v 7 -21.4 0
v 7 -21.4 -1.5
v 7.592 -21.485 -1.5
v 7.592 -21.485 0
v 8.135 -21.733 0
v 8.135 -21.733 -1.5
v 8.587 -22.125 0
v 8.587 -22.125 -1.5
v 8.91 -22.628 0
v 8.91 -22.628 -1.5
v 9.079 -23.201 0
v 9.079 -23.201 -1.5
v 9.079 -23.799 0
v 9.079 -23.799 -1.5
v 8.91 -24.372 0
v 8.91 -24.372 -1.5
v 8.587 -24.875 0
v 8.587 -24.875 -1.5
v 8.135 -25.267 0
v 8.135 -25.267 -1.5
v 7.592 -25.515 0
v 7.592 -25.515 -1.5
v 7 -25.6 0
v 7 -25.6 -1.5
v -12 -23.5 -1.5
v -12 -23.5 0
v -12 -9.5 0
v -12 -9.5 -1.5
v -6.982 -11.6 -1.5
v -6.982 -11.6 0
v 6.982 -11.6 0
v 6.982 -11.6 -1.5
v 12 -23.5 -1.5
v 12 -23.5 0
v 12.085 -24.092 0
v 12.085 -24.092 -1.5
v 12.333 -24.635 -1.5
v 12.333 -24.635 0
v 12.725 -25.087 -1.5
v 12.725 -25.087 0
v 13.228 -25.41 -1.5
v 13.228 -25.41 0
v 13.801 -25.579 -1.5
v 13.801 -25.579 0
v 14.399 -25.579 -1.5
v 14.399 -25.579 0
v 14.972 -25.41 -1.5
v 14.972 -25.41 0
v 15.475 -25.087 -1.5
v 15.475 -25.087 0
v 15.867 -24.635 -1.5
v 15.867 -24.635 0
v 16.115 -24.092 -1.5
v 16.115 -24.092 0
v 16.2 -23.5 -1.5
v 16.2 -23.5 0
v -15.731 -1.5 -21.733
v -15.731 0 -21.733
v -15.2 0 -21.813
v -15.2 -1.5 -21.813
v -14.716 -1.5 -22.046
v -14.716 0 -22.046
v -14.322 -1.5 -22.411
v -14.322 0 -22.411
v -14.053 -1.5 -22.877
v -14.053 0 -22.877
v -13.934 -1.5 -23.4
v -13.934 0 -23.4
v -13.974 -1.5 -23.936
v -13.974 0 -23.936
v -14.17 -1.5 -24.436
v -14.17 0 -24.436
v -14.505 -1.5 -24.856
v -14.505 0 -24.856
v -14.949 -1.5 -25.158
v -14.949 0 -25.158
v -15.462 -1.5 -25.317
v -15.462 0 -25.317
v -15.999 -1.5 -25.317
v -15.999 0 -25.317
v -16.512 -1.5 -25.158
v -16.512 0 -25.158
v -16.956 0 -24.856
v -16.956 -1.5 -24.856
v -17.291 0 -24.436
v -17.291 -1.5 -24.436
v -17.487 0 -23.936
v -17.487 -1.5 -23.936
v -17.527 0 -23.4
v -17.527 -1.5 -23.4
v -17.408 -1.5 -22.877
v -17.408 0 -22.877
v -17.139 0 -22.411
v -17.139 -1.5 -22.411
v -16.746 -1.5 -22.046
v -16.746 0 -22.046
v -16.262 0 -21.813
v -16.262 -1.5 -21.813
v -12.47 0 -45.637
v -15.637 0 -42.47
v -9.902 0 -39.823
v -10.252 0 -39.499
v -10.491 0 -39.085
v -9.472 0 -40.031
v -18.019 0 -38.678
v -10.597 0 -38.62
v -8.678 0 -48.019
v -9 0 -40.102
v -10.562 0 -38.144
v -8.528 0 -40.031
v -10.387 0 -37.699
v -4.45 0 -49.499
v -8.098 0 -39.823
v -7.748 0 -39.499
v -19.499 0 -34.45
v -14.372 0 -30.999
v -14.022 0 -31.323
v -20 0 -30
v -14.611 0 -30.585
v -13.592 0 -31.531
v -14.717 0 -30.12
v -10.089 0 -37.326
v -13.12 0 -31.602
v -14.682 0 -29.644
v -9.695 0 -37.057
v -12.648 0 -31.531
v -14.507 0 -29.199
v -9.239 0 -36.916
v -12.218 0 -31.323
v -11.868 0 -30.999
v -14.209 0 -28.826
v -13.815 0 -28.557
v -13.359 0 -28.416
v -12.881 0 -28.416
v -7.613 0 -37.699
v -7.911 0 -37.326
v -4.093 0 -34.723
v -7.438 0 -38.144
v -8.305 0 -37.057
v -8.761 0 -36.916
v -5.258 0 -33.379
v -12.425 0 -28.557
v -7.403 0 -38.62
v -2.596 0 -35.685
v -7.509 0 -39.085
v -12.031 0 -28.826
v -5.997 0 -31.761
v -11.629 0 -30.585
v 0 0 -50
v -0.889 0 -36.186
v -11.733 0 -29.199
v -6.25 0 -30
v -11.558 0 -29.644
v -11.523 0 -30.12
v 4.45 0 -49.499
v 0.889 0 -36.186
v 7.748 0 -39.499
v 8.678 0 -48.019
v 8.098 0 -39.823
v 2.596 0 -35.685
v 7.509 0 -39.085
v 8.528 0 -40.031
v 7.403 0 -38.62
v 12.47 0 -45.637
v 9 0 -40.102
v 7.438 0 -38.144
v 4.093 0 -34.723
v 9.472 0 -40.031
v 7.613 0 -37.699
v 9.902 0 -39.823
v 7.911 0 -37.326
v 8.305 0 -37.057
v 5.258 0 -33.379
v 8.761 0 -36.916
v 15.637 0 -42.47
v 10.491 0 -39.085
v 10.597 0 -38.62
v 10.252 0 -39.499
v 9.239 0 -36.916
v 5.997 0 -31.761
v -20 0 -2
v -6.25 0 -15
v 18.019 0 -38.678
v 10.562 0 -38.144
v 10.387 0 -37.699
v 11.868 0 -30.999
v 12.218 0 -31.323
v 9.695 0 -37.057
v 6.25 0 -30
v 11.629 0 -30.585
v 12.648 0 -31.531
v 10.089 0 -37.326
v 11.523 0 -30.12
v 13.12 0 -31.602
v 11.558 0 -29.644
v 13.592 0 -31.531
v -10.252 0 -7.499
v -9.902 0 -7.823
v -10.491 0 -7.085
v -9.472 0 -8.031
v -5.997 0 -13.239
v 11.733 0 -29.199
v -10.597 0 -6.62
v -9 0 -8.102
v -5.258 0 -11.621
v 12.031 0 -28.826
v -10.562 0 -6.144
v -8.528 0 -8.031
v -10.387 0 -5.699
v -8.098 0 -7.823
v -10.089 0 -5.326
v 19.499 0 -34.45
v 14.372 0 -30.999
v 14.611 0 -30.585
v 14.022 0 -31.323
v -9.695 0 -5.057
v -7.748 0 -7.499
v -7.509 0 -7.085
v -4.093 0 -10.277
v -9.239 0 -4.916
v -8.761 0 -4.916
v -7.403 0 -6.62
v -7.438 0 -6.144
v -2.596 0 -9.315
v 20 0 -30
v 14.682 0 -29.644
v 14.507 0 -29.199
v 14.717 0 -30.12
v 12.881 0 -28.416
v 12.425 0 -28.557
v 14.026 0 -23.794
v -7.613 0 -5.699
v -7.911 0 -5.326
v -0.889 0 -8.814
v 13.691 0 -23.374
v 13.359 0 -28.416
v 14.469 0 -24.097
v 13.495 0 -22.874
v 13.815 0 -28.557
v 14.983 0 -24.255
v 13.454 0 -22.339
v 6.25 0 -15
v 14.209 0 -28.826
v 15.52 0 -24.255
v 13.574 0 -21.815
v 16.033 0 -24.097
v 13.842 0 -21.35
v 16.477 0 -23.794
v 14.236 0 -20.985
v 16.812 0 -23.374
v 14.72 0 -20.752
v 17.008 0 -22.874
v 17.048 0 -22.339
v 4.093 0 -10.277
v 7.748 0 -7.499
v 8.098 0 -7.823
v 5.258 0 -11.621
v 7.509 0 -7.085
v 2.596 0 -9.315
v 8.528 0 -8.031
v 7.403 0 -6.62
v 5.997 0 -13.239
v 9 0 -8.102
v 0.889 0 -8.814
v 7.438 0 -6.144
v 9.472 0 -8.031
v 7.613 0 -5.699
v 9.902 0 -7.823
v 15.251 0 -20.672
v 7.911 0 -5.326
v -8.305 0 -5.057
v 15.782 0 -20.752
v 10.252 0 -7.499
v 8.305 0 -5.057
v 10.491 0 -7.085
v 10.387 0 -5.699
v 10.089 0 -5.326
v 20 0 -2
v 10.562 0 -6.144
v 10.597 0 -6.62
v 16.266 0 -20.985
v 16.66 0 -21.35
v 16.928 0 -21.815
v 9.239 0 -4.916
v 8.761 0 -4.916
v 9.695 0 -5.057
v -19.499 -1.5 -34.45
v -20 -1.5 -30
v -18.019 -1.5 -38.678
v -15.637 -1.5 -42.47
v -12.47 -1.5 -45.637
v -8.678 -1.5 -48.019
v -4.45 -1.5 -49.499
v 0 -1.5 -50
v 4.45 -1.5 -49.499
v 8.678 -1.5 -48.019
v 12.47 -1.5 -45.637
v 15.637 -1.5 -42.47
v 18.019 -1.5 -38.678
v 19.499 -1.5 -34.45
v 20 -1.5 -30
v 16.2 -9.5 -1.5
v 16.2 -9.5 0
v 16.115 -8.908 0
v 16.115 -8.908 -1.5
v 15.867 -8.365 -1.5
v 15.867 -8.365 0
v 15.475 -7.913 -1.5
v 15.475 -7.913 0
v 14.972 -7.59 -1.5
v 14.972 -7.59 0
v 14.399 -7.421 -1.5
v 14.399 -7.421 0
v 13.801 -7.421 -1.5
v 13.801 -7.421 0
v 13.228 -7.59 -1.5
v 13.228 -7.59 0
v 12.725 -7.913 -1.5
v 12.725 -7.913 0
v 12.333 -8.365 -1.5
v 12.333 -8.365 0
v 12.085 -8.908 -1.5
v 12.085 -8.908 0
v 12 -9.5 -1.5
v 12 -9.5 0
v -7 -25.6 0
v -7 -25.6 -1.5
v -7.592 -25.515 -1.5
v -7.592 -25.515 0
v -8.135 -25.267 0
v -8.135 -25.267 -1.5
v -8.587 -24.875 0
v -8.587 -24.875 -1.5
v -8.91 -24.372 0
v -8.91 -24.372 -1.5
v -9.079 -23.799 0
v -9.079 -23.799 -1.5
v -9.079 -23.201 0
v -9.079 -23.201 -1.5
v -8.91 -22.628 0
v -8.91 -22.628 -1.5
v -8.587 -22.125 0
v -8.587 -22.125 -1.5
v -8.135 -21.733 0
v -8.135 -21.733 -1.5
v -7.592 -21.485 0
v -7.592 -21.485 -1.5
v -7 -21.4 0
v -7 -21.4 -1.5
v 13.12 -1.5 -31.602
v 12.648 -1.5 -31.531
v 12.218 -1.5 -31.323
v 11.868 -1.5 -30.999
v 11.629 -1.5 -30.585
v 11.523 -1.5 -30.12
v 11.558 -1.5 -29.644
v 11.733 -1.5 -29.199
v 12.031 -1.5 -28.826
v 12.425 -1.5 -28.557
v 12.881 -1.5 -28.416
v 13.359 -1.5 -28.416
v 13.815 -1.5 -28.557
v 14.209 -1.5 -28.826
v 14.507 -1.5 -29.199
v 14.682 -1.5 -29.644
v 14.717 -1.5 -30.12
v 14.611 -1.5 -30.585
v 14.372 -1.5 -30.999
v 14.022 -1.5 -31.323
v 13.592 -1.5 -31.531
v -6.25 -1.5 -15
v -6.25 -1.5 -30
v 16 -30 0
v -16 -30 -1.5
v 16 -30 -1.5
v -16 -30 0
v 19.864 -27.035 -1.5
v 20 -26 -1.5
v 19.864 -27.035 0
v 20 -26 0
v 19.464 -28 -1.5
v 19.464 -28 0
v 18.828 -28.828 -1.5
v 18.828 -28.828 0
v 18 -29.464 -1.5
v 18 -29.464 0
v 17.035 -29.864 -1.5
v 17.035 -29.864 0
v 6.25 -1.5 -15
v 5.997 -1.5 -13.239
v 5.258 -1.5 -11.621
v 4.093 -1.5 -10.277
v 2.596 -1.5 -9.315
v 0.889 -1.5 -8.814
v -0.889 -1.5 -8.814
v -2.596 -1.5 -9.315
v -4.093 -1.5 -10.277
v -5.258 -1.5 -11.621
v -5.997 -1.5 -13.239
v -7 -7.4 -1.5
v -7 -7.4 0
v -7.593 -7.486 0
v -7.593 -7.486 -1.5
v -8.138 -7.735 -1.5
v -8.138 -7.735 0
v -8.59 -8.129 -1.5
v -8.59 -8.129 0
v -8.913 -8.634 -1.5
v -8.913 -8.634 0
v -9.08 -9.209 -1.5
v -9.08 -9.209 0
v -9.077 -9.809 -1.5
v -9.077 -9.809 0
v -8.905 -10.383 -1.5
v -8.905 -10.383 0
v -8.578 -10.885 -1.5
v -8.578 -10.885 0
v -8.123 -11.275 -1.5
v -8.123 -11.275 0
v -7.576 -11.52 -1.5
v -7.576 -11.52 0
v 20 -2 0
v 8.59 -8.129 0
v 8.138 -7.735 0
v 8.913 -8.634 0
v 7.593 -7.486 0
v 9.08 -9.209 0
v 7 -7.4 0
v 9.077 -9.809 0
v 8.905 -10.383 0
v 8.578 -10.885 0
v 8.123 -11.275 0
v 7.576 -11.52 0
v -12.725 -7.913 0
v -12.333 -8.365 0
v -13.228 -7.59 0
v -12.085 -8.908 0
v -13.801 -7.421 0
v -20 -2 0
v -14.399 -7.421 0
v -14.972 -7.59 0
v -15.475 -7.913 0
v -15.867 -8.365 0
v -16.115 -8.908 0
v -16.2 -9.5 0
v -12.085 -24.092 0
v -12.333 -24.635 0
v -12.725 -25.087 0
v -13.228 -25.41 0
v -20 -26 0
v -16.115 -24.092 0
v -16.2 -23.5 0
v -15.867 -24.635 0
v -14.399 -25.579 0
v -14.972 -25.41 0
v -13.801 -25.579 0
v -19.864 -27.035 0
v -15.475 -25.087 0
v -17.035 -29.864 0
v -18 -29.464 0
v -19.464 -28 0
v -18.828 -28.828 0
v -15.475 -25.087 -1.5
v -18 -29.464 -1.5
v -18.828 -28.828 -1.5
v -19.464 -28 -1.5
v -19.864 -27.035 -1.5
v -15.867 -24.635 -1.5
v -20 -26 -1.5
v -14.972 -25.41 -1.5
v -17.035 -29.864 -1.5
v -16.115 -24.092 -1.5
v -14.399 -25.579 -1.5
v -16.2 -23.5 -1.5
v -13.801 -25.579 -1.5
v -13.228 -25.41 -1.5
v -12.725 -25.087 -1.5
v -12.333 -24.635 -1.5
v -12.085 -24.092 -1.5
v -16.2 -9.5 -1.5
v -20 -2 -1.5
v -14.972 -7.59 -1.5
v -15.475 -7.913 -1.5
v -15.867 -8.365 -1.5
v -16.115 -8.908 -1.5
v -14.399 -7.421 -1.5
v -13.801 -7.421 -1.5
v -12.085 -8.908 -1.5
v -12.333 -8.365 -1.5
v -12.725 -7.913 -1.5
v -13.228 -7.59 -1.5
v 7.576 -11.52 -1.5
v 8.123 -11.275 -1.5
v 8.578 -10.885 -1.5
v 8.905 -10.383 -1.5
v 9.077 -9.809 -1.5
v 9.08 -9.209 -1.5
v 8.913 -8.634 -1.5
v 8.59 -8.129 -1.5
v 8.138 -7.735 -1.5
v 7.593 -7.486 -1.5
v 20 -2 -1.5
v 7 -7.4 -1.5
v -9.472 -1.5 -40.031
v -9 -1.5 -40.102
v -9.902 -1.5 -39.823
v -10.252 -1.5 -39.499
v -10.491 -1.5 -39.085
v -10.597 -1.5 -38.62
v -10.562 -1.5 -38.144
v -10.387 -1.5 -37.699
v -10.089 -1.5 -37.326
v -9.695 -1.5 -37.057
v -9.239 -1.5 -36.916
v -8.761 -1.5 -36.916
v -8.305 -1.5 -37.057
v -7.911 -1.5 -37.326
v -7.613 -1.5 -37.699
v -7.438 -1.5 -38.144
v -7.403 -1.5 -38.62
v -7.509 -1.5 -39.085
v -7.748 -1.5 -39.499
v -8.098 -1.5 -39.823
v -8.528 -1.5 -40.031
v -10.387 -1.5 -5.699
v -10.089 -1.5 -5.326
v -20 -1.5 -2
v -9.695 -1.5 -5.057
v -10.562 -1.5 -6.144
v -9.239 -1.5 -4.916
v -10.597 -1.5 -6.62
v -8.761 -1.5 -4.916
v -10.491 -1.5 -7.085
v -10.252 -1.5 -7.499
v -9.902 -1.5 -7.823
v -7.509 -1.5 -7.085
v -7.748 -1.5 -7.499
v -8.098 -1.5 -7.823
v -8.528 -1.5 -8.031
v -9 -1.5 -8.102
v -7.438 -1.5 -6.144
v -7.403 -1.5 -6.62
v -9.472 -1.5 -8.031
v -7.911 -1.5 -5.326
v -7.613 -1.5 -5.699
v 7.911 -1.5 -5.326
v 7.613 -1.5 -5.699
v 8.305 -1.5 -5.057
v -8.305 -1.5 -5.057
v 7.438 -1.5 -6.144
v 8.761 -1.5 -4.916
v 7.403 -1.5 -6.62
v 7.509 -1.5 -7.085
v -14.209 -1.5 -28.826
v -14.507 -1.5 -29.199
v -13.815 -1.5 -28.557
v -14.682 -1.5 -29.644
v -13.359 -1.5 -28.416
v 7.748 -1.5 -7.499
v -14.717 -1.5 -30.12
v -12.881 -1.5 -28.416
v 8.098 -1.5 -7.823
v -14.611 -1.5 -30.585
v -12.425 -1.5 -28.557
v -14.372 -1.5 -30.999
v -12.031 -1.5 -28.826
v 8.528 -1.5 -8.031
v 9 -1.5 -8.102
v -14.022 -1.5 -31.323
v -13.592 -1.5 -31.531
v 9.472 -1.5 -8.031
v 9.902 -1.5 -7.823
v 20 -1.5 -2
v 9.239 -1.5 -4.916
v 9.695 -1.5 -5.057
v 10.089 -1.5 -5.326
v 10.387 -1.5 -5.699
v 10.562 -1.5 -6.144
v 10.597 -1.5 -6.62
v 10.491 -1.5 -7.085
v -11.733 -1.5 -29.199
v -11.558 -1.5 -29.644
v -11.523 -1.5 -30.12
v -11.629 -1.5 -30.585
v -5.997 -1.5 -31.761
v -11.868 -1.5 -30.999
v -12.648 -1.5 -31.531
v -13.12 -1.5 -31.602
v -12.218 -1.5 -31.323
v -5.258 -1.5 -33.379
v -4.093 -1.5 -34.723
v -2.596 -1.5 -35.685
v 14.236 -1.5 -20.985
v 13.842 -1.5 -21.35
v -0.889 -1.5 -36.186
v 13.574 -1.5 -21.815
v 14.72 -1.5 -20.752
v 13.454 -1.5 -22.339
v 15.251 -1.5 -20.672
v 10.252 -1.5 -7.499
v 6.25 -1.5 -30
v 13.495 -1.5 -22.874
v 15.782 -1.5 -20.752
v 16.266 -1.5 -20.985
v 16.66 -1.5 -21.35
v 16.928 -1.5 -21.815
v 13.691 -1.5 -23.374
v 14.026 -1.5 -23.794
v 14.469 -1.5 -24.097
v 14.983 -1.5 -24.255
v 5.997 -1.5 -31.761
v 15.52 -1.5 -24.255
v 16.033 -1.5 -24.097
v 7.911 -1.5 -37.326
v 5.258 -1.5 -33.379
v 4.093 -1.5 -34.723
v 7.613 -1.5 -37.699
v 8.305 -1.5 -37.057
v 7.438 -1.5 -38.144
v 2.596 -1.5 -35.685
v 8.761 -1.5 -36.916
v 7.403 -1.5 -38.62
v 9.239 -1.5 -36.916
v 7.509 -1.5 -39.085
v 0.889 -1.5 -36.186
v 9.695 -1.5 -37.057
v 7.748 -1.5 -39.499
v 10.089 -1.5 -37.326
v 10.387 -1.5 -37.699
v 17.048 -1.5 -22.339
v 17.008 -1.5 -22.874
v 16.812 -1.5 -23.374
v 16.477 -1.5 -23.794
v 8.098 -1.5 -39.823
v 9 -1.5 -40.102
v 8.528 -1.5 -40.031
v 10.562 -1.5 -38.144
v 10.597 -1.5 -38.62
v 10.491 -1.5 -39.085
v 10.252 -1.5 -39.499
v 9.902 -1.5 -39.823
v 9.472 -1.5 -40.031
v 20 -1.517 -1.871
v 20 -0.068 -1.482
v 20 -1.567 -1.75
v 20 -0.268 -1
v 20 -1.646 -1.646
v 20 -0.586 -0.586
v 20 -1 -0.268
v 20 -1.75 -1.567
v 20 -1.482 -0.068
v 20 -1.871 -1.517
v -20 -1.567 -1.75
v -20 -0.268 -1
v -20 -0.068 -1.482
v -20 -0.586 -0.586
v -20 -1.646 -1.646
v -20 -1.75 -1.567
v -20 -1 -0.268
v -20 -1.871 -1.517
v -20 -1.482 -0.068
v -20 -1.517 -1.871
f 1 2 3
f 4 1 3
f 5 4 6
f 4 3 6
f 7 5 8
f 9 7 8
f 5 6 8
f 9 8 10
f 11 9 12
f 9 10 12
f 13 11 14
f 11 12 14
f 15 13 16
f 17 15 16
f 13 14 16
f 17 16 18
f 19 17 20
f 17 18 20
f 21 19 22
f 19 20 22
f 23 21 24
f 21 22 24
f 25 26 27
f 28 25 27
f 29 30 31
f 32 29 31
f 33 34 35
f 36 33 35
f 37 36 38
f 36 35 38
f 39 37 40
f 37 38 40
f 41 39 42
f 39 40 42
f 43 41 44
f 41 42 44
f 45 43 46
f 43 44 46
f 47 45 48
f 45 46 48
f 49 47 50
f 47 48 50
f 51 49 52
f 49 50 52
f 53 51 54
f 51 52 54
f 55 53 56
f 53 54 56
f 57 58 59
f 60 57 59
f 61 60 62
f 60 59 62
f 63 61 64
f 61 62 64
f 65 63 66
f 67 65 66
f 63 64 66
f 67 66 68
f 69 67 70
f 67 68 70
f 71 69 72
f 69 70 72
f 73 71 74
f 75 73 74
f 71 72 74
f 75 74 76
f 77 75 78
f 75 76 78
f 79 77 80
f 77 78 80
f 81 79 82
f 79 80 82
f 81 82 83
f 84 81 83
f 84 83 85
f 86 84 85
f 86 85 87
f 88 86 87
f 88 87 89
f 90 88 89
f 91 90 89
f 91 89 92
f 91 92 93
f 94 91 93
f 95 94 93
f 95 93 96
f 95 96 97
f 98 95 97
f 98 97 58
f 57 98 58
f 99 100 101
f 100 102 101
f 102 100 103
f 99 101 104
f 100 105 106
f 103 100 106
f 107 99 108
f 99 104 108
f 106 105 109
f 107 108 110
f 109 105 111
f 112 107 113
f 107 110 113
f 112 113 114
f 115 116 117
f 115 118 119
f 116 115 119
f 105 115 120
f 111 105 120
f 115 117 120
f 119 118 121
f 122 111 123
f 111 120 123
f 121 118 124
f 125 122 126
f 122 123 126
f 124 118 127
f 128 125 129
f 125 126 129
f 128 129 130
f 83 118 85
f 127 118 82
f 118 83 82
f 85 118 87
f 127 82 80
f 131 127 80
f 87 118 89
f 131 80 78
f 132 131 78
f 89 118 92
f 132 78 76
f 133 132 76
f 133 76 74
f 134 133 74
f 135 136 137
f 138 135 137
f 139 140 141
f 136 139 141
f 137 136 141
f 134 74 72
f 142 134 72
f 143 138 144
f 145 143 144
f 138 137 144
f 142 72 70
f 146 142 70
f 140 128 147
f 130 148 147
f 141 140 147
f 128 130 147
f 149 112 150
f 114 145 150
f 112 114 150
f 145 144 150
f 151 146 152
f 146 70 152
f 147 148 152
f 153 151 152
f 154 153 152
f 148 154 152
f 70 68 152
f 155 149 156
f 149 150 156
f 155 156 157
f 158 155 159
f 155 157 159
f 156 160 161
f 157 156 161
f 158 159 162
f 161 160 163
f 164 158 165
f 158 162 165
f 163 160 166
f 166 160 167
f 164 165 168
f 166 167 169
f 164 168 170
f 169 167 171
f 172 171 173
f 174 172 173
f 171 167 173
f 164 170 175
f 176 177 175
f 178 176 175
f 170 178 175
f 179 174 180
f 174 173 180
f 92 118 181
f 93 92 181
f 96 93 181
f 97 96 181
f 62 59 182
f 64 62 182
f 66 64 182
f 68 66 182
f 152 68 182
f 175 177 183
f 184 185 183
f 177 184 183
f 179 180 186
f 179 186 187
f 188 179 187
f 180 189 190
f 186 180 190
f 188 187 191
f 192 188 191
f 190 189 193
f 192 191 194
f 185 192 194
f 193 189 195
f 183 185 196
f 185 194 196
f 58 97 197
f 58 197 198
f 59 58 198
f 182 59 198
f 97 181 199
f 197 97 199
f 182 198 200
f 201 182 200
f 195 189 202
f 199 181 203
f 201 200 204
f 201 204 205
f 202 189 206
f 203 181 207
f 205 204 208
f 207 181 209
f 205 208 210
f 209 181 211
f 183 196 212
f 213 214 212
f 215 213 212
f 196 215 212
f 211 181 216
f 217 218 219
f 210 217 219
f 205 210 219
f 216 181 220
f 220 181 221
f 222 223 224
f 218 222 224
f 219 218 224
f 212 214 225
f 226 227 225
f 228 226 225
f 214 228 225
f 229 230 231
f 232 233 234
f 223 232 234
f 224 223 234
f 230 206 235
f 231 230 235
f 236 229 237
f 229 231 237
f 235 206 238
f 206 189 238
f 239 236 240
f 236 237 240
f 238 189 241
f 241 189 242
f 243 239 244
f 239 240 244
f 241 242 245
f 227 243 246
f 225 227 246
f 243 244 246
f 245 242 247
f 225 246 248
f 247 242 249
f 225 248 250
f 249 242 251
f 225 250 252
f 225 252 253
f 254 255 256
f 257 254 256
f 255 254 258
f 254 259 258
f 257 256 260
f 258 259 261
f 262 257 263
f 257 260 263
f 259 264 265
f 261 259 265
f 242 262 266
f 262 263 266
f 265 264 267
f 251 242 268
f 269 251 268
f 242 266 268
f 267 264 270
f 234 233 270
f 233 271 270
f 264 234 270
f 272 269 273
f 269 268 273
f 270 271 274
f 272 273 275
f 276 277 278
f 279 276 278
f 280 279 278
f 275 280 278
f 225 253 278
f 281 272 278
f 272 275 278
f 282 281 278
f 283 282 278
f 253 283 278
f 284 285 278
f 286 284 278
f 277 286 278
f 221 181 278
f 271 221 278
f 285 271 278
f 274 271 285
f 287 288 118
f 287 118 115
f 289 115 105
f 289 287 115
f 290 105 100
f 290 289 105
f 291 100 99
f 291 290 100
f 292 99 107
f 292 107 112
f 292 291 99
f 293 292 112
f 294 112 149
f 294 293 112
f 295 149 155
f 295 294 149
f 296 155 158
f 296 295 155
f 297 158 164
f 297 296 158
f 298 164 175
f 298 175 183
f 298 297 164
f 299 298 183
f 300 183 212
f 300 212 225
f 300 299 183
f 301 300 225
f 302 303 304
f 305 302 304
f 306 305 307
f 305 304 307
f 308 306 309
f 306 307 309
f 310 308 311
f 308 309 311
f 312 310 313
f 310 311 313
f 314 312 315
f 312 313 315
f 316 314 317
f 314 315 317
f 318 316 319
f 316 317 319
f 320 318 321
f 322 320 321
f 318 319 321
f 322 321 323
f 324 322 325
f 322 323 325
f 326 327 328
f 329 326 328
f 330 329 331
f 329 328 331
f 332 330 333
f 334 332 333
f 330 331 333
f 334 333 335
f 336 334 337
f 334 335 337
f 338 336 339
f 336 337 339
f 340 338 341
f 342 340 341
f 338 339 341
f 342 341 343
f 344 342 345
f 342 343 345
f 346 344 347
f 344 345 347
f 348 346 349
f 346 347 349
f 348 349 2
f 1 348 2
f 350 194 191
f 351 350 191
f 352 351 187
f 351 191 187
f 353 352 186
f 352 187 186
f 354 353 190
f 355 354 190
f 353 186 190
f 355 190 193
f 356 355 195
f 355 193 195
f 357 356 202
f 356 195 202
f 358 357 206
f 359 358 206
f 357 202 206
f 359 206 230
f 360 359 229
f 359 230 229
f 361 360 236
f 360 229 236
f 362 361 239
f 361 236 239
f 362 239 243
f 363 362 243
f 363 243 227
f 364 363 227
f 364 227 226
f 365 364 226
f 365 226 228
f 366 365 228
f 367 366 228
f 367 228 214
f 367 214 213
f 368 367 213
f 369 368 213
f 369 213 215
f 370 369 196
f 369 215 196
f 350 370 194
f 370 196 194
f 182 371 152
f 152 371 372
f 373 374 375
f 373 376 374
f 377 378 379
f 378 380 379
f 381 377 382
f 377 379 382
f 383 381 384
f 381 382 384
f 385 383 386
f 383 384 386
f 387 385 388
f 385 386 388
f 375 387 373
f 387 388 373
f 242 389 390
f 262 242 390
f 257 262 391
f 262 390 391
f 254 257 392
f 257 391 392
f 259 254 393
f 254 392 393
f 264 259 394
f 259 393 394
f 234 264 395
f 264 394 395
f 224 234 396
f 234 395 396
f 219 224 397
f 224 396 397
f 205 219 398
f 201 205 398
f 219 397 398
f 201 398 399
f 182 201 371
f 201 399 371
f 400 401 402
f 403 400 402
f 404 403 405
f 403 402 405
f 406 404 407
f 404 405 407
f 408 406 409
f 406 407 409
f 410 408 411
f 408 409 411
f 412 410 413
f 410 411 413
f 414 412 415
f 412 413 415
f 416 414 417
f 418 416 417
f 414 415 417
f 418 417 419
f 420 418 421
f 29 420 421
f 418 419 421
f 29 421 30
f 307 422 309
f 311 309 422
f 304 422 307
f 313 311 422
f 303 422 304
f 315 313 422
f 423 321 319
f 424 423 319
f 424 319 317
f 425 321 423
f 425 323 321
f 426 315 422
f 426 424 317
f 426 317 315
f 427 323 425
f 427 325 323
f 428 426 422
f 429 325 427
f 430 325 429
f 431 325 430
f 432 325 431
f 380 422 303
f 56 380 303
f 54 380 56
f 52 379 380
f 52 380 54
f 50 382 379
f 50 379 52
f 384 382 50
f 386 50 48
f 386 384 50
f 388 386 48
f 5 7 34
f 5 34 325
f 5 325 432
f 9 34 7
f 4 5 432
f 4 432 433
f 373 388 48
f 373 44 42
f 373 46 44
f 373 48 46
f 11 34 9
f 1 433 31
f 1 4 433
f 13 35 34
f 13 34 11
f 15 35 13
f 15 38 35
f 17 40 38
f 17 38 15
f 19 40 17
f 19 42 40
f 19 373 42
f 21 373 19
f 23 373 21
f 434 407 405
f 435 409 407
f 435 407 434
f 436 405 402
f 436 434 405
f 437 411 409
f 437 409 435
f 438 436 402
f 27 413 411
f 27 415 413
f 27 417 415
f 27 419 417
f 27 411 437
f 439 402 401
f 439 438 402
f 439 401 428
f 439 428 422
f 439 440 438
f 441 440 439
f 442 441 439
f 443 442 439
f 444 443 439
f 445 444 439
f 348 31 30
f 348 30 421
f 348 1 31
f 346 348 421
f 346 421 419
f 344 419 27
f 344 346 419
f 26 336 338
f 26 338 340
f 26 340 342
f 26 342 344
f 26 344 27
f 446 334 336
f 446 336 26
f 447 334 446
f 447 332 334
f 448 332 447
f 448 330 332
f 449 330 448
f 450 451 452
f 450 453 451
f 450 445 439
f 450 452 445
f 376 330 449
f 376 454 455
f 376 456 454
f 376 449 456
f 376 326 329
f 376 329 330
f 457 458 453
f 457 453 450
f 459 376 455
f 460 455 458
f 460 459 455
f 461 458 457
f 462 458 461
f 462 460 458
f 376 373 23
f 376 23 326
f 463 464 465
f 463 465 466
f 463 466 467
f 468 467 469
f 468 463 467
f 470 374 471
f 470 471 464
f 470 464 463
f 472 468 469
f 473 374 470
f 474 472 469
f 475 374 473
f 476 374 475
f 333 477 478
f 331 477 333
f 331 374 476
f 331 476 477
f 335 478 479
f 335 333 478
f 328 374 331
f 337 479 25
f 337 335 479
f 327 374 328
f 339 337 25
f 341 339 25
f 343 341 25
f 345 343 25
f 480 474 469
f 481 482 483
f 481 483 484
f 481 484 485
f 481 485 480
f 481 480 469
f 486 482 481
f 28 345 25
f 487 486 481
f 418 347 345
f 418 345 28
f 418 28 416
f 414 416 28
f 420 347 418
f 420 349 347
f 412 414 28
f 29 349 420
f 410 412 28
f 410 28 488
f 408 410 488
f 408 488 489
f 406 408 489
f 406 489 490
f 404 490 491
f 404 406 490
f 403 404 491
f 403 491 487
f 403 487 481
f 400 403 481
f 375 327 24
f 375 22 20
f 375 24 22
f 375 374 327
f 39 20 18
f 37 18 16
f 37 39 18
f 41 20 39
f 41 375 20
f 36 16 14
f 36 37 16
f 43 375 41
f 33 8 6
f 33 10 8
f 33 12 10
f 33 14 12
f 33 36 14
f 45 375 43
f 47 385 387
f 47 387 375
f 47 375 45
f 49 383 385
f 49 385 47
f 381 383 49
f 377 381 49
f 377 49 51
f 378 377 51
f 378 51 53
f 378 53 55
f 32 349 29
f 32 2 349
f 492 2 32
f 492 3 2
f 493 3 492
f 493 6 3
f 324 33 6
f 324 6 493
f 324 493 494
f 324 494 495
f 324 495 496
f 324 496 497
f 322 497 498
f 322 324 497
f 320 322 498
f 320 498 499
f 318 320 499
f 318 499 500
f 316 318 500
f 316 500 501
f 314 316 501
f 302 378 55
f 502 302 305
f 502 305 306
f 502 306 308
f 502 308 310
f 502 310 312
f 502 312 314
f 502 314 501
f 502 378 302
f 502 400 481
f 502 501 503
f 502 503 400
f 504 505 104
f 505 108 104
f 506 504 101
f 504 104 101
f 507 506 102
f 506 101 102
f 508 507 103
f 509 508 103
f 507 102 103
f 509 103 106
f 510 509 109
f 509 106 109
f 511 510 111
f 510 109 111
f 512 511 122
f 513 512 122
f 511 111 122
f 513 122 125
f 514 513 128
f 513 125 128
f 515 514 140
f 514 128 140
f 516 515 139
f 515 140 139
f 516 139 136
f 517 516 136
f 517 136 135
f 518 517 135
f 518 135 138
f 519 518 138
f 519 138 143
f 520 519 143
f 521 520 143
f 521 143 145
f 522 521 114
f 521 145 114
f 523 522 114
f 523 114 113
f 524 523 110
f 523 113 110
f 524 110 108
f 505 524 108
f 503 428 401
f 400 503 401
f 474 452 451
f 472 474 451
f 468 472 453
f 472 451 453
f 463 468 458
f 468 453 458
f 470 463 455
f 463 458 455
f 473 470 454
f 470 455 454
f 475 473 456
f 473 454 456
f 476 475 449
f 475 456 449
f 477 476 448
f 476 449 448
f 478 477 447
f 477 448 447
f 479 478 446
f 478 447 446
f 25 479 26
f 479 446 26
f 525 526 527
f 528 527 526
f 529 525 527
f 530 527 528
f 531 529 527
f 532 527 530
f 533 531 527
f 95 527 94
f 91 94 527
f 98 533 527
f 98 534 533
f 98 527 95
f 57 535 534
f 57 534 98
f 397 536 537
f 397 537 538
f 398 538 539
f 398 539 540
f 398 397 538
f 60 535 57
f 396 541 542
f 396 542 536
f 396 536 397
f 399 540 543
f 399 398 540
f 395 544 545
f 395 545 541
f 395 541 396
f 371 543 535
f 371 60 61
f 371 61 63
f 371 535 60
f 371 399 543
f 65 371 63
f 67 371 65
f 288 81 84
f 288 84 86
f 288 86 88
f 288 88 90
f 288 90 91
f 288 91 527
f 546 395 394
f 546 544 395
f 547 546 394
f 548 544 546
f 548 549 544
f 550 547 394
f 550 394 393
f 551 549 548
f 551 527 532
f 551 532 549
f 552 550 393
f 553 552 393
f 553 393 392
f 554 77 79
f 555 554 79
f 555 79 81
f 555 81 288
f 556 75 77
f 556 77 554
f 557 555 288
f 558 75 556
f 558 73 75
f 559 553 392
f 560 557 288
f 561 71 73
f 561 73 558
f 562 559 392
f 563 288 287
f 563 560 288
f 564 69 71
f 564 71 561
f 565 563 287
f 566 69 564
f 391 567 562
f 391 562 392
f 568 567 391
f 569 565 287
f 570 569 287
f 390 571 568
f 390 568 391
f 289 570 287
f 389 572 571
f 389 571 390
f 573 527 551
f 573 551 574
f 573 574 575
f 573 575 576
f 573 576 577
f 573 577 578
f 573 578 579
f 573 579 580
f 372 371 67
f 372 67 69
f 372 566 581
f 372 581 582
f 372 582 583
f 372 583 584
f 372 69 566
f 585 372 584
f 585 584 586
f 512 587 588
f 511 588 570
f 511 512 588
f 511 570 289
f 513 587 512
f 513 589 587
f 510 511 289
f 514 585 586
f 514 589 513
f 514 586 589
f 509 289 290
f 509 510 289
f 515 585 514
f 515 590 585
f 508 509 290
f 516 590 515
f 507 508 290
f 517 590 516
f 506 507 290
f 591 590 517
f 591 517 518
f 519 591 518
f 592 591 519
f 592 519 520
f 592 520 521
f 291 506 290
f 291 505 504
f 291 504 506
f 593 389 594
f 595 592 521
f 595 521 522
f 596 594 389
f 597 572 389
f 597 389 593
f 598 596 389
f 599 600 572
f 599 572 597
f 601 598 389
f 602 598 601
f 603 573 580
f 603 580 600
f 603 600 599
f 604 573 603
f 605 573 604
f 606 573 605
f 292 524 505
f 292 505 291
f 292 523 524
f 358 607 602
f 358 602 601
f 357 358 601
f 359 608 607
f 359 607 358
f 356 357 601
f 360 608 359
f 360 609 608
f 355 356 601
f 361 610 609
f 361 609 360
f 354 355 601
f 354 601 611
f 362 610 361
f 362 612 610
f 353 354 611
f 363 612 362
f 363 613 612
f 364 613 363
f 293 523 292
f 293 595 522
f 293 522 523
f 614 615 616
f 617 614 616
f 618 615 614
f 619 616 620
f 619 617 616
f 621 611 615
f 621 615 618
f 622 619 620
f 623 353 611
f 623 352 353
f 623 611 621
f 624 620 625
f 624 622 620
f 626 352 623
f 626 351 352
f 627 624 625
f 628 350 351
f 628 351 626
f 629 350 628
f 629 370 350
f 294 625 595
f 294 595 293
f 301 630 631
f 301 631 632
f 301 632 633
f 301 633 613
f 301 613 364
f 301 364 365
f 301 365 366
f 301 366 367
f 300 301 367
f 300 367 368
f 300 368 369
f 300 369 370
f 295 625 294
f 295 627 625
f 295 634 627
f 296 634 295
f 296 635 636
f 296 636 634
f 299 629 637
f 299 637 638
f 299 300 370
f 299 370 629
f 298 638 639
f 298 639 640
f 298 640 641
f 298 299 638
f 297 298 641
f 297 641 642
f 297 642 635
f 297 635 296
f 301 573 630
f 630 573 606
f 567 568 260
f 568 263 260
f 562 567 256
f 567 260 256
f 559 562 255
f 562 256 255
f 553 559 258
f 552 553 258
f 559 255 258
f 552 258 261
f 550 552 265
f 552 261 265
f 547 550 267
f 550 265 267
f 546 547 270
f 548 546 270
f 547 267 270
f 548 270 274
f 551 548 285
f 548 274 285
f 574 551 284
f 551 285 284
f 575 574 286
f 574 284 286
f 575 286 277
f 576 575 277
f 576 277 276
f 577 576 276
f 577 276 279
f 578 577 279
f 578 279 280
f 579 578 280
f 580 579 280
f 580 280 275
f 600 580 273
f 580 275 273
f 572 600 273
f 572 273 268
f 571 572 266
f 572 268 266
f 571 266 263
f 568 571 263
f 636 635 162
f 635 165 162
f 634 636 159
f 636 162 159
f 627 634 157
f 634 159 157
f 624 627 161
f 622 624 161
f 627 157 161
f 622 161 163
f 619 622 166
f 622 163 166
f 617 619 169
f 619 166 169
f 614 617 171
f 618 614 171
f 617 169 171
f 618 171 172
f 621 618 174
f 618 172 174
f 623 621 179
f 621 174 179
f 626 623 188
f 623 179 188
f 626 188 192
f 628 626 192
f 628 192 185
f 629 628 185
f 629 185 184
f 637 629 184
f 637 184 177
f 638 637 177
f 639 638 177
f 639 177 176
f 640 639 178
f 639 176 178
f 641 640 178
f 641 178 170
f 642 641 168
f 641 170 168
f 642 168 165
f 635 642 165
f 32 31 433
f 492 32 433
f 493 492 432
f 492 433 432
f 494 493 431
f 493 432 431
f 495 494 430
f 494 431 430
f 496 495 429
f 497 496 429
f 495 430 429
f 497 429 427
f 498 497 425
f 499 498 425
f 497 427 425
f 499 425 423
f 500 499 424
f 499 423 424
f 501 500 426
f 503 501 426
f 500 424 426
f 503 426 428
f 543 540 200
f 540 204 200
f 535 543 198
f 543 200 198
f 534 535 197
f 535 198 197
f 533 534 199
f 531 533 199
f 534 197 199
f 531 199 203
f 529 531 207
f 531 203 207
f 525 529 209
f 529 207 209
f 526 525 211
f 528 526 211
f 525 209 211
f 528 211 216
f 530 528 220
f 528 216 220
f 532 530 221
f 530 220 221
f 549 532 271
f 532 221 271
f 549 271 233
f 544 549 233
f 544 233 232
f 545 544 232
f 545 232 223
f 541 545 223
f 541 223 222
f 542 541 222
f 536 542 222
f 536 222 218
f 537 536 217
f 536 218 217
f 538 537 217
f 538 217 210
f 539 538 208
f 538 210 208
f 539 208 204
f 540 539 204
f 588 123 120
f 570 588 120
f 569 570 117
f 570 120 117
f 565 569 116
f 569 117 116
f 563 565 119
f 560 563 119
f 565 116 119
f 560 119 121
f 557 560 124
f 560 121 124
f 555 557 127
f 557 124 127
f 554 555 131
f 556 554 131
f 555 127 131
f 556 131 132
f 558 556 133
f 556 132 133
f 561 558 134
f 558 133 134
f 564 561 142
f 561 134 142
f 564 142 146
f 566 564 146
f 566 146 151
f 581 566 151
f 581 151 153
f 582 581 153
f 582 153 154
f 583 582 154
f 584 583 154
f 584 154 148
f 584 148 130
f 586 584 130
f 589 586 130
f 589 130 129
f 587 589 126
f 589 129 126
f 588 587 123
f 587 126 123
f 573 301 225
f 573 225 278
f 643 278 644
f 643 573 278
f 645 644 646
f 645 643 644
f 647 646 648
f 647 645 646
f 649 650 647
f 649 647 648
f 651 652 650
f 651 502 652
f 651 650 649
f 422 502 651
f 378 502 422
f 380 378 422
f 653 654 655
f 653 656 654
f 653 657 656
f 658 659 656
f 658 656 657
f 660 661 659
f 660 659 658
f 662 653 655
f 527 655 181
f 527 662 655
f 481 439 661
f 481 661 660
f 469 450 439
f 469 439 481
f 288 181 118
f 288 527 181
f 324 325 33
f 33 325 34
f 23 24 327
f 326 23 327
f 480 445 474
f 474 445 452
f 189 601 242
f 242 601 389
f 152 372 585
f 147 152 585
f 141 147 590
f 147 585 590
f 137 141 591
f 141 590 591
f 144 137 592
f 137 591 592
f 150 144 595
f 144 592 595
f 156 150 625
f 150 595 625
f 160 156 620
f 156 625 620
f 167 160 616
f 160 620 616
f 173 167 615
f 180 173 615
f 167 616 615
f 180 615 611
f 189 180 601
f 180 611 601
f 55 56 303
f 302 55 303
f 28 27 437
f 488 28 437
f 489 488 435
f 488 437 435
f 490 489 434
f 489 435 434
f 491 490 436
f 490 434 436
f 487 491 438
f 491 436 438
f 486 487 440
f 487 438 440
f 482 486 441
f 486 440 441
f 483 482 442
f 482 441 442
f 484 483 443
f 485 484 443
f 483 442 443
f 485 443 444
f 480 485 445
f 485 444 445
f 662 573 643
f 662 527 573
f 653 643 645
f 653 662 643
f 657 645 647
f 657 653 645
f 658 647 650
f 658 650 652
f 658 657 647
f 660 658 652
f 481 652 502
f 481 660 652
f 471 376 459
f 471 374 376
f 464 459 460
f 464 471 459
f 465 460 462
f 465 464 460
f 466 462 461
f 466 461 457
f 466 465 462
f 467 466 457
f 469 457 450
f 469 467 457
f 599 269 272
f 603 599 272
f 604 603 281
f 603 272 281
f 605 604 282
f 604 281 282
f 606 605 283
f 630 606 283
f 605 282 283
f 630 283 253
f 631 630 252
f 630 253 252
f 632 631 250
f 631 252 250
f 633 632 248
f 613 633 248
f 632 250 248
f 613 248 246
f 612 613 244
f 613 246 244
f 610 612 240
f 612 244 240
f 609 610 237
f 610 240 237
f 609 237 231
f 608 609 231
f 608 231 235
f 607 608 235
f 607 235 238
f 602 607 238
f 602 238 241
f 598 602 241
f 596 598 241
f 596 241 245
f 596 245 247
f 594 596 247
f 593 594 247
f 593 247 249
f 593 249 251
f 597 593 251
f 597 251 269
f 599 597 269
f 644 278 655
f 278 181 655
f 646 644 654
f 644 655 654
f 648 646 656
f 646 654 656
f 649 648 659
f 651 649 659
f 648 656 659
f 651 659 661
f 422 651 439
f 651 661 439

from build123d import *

# Parameters (mm, degrees)
BOSS_EXTRUDE1_DEPTH           = 30
SKETCH2_W                     = 28.5
SKETCH2_H                     = 28.5
CUT_EXTRUDE1_DEPTH            = 71.710678119
CUT_EXTRUDE2_REACH            = 63.644
CUT_EXTRUDE3_REACH            = 63.644
CUT_EXTRUDE4_REACH            = 63.644
CUT_EXTRUDE5_DEPTH            = 61.928236475
CUT_EXTRUDE6_DEPTH            = 61.433848132
SKETCH8_W                     = 1.601710745
SKETCH8_H                     = 1.5
M3_CLEARANCE_HOLE1_AT_2_COUNT = 2
M3_CLEARANCE_HOLE1_AT_2_PITCH = 18
M3_CLEARANCE_HOLE1_AT_3_COUNT = 2
M3_CLEARANCE_HOLE1_AT_3_PITCH = 32
M3_CLEARANCE_HOLE1_AT_4_COUNT = 2
M3_CLEARANCE_HOLE1_AT_4_PITCH = 36.715119501
M3_CLEARANCE_HOLE1_AT_5_COUNT = 2
M3_CLEARANCE_HOLE1_AT_5_PITCH = 23.858424089
M3_CLEARANCE_HOLE1_AT_6_COUNT = 2
M3_CLEARANCE_HOLE1_AT_6_PITCH = 32.272967016
FILLET1_R                     = 0.5
FILLET2_R                     = 2
FILLET3_R                     = 4
CUT_EXTRUDE7_DEPTH            = 28.5
SKETCH11_R                    = 1.801810181
CUT_EXTRUDE8_DEPTH            = 62.64414003


with BuildPart() as part:
    # Sketch1 → Boss-Extrude1 (new body)
    with BuildSketch(Plane.XZ.offset(30)):
        with BuildLine():
            Line((20, 0), (-20, 0))
            Line((-20, 0), (-20, -30))
            ThreePointArc((-20, -30), (0, -50), (20, -30))
            Line((20, -30), (20, 0))
        make_face()
    extrude(amount=-BOSS_EXTRUDE1_DEPTH)

    # Sketch2 → Cut-Extrude1 (cut, through all)
    with BuildSketch(Plane(origin=(20, 0, 0), x_dir=(0, 0, -1), z_dir=(1, 0, 0))):
        with Locations((15.75, -15.75)):
            Rectangle(SKETCH2_W, SKETCH2_H)
    extrude(amount=-CUT_EXTRUDE1_DEPTH, mode=Mode.SUBTRACT)

    # Sketch3 → Cut-Extrude2 (cut, up to next)
    with BuildSketch(Plane.XY, mode=Mode.PRIVATE) as cut_extrude2_sk1:
        with BuildLine():
            Line((16.2, -23.5), (16.2, -9.5))
            ThreePointArc((16.2, -9.5), (14.1, -7.4), (12, -9.5))
            Line((12, -9.5), (12, -23.5))
            ThreePointArc((12, -23.5), (14.1, -25.6), (16.2, -23.5))
        make_face()
    cut_extrude2_tool1 = extrude(cut_extrude2_sk1.sketch, amount=-CUT_EXTRUDE2_REACH, mode=Mode.PRIVATE) & part.part
    add(cut_extrude2_tool1.solids().sort_by_distance((14.1, -16.5, 0))[0], mode=Mode.SUBTRACT)

    # Sketch4 → Cut-Extrude3 (cut, up to next)
    with BuildSketch(Plane.XY, mode=Mode.PRIVATE) as cut_extrude3_sk1:
        with BuildLine():
            Line((-16.2, -9.5), (-16.2, -23.5))
            ThreePointArc((-16.2, -23.5), (-14.1, -25.6), (-12, -23.5))
            Line((-12, -23.5), (-12, -9.5))
            ThreePointArc((-12, -9.5), (-14.1, -7.4), (-16.2, -9.5))
        make_face()
    cut_extrude3_tool1 = extrude(cut_extrude3_sk1.sketch, amount=-CUT_EXTRUDE3_REACH, mode=Mode.PRIVATE) & part.part
    add(cut_extrude3_tool1.solids().sort_by_distance((-14.1, -16.5, 0))[0], mode=Mode.SUBTRACT)

    # Sketch5 → Cut-Extrude4 (cut, up to next)
    with BuildSketch(Plane.XY, mode=Mode.PRIVATE) as cut_extrude4_sk1:
        with BuildLine():
            Line((-6.981600402, -11.599919392), (6.981600402, -11.599919392))
            ThreePointArc((6.981600402, -11.599919392), (9.099979848, -9.509199887), (7, -7.4))
            Line((7, -7.4), (-7, -7.4))
            ThreePointArc((-7, -7.4), (-9.099979848, -9.509199887), (-6.981600402, -11.599919392))
        make_face()
    cut_extrude4_tool1 = extrude(cut_extrude4_sk1.sketch, amount=-CUT_EXTRUDE4_REACH, mode=Mode.PRIVATE) & part.part
    add(cut_extrude4_tool1.solids().sort_by_distance((0, -9.499967, 0))[0], mode=Mode.SUBTRACT)

    # Sketch6 → Cut-Extrude5 (cut, through all)
    with BuildSketch(Plane.XZ.offset(1.5)):
        with BuildLine():
            Line((6.25, -30), (6.25, -15))
            ThreePointArc((6.25, -15), (0, -8.75), (-6.25, -15))
            Line((-6.25, -15), (-6.25, -30))
            ThreePointArc((-6.25, -30), (0, -36.25), (6.25, -30))
        make_face()
    extrude(amount=-CUT_EXTRUDE5_DEPTH, mode=Mode.SUBTRACT)

    # Sketch7 → Cut-Extrude6 (cut, through all)
    with BuildSketch(Plane(origin=(0, 0, -1.5), x_dir=(-1, 0, 0), z_dir=(0, 0, -1))):
        with BuildLine():
            Line((-7, -25.6), (7, -25.6))
            ThreePointArc((7, -25.6), (9.1, -23.5), (7, -21.4))
            Line((7, -21.4), (-7, -21.4))
            ThreePointArc((-7, -21.4), (-9.1, -23.5), (-7, -25.6))
        make_face()
    extrude(amount=-CUT_EXTRUDE6_DEPTH, mode=Mode.SUBTRACT)

    # Sketch8 → M3 Clearance Hole1 (revolve, cut)
    with BuildSketch(Plane(origin=(-9, -1.5, -6.5), x_dir=(0, 0, -1), z_dir=(1, 0, 0))):
        with Locations((0.800855373, 0.75)):
            Rectangle(SKETCH8_W, SKETCH8_H)
    m3_clearance_hole1 = revolve(axis=Axis((-9, -7.85, -6.5), (0, 1, 0)), mode=Mode.SUBTRACT)

    # M3 Clearance Hole1 at 2: M3 Clearance Hole1 ×2
    with Locations(*[(i * M3_CLEARANCE_HOLE1_AT_2_PITCH, 0, 0) for i in range(1, M3_CLEARANCE_HOLE1_AT_2_COUNT)]):
        add(m3_clearance_hole1, mode=Mode.SUBTRACT)

    # M3 Clearance Hole1 at 3: M3 Clearance Hole1 ×2
    with Locations(*[(0, 0, -i * M3_CLEARANCE_HOLE1_AT_3_PITCH) for i in range(1, M3_CLEARANCE_HOLE1_AT_3_COUNT)]):
        add(m3_clearance_hole1, mode=Mode.SUBTRACT)

    # M3 Clearance Hole1 at 4: M3 Clearance Hole1 ×2
    with Locations(*[Vector(0.4902612396325592, 0, -0.8715755371245493) * (i * M3_CLEARANCE_HOLE1_AT_4_PITCH) for i in range(1, M3_CLEARANCE_HOLE1_AT_4_COUNT)]):
        add(m3_clearance_hole1, mode=Mode.SUBTRACT)

    # M3 Clearance Hole1 at 5: M3 Clearance Hole1 ×2
    with Locations(*[Vector(-0.17268533682984544, 0, -0.9849770425974216) * (i * M3_CLEARANCE_HOLE1_AT_5_PITCH) for i in range(1, M3_CLEARANCE_HOLE1_AT_5_COUNT)]):
        add(m3_clearance_hole1, mode=Mode.SUBTRACT)

    # M3 Clearance Hole1 at 6: M3 Clearance Hole1 ×2
    with Locations(*[Vector(0.6854033590776325, 0, -0.7281636048067069) * (i * M3_CLEARANCE_HOLE1_AT_6_PITCH) for i in range(1, M3_CLEARANCE_HOLE1_AT_6_COUNT)]):
        add(m3_clearance_hole1, mode=Mode.SUBTRACT)

    # Fillet1
    fillet1_edges = [part.edges().sort_by_distance(p)[0] for p in [
        (0, -1.5, -1.5),
    ]]
    fillet(fillet1_edges, radius=FILLET1_R)

    # Fillet2
    fillet2_edges = [part.edges().sort_by_distance(p)[0] for p in [
        (0, 0, 0),
    ]]
    fillet(fillet2_edges, radius=FILLET2_R)

    # Fillet3
    fillet3_edges = [part.edges().sort_by_distance(p)[0] for p in [
        (20, -30, -0.75),
        (-20, -30, -0.75),
    ]]
    fillet(fillet3_edges, radius=FILLET3_R)

    # Sketch10 → Cut-Extrude7 (cut)
    with BuildSketch(Plane.XZ.offset(30)):
        with BuildLine():
            Line((-20, -30), (20, -30))
            ThreePointArc((20, -30), (0, -50), (-20, -30))
        make_face()
    extrude(amount=-CUT_EXTRUDE7_DEPTH, mode=Mode.SUBTRACT)

    # Sketch11 → Cut-Extrude8 (cut, through all)
    with BuildSketch(Plane(origin=(0, 0, 0), x_dir=(1, 0, 0), z_dir=(0, 1, 0))):
        with Locations(Location((-15.73061053, 23.534870495, 0), (0, 0, 270))):
            Circle(SKETCH11_R)
        with Locations(Location((15.251209648, 22.473339956, 0), (0, 0, 270))):
            Circle(SKETCH11_R)
    extrude(amount=-CUT_EXTRUDE8_DEPTH, mode=Mode.SUBTRACT)


solid = part.part
